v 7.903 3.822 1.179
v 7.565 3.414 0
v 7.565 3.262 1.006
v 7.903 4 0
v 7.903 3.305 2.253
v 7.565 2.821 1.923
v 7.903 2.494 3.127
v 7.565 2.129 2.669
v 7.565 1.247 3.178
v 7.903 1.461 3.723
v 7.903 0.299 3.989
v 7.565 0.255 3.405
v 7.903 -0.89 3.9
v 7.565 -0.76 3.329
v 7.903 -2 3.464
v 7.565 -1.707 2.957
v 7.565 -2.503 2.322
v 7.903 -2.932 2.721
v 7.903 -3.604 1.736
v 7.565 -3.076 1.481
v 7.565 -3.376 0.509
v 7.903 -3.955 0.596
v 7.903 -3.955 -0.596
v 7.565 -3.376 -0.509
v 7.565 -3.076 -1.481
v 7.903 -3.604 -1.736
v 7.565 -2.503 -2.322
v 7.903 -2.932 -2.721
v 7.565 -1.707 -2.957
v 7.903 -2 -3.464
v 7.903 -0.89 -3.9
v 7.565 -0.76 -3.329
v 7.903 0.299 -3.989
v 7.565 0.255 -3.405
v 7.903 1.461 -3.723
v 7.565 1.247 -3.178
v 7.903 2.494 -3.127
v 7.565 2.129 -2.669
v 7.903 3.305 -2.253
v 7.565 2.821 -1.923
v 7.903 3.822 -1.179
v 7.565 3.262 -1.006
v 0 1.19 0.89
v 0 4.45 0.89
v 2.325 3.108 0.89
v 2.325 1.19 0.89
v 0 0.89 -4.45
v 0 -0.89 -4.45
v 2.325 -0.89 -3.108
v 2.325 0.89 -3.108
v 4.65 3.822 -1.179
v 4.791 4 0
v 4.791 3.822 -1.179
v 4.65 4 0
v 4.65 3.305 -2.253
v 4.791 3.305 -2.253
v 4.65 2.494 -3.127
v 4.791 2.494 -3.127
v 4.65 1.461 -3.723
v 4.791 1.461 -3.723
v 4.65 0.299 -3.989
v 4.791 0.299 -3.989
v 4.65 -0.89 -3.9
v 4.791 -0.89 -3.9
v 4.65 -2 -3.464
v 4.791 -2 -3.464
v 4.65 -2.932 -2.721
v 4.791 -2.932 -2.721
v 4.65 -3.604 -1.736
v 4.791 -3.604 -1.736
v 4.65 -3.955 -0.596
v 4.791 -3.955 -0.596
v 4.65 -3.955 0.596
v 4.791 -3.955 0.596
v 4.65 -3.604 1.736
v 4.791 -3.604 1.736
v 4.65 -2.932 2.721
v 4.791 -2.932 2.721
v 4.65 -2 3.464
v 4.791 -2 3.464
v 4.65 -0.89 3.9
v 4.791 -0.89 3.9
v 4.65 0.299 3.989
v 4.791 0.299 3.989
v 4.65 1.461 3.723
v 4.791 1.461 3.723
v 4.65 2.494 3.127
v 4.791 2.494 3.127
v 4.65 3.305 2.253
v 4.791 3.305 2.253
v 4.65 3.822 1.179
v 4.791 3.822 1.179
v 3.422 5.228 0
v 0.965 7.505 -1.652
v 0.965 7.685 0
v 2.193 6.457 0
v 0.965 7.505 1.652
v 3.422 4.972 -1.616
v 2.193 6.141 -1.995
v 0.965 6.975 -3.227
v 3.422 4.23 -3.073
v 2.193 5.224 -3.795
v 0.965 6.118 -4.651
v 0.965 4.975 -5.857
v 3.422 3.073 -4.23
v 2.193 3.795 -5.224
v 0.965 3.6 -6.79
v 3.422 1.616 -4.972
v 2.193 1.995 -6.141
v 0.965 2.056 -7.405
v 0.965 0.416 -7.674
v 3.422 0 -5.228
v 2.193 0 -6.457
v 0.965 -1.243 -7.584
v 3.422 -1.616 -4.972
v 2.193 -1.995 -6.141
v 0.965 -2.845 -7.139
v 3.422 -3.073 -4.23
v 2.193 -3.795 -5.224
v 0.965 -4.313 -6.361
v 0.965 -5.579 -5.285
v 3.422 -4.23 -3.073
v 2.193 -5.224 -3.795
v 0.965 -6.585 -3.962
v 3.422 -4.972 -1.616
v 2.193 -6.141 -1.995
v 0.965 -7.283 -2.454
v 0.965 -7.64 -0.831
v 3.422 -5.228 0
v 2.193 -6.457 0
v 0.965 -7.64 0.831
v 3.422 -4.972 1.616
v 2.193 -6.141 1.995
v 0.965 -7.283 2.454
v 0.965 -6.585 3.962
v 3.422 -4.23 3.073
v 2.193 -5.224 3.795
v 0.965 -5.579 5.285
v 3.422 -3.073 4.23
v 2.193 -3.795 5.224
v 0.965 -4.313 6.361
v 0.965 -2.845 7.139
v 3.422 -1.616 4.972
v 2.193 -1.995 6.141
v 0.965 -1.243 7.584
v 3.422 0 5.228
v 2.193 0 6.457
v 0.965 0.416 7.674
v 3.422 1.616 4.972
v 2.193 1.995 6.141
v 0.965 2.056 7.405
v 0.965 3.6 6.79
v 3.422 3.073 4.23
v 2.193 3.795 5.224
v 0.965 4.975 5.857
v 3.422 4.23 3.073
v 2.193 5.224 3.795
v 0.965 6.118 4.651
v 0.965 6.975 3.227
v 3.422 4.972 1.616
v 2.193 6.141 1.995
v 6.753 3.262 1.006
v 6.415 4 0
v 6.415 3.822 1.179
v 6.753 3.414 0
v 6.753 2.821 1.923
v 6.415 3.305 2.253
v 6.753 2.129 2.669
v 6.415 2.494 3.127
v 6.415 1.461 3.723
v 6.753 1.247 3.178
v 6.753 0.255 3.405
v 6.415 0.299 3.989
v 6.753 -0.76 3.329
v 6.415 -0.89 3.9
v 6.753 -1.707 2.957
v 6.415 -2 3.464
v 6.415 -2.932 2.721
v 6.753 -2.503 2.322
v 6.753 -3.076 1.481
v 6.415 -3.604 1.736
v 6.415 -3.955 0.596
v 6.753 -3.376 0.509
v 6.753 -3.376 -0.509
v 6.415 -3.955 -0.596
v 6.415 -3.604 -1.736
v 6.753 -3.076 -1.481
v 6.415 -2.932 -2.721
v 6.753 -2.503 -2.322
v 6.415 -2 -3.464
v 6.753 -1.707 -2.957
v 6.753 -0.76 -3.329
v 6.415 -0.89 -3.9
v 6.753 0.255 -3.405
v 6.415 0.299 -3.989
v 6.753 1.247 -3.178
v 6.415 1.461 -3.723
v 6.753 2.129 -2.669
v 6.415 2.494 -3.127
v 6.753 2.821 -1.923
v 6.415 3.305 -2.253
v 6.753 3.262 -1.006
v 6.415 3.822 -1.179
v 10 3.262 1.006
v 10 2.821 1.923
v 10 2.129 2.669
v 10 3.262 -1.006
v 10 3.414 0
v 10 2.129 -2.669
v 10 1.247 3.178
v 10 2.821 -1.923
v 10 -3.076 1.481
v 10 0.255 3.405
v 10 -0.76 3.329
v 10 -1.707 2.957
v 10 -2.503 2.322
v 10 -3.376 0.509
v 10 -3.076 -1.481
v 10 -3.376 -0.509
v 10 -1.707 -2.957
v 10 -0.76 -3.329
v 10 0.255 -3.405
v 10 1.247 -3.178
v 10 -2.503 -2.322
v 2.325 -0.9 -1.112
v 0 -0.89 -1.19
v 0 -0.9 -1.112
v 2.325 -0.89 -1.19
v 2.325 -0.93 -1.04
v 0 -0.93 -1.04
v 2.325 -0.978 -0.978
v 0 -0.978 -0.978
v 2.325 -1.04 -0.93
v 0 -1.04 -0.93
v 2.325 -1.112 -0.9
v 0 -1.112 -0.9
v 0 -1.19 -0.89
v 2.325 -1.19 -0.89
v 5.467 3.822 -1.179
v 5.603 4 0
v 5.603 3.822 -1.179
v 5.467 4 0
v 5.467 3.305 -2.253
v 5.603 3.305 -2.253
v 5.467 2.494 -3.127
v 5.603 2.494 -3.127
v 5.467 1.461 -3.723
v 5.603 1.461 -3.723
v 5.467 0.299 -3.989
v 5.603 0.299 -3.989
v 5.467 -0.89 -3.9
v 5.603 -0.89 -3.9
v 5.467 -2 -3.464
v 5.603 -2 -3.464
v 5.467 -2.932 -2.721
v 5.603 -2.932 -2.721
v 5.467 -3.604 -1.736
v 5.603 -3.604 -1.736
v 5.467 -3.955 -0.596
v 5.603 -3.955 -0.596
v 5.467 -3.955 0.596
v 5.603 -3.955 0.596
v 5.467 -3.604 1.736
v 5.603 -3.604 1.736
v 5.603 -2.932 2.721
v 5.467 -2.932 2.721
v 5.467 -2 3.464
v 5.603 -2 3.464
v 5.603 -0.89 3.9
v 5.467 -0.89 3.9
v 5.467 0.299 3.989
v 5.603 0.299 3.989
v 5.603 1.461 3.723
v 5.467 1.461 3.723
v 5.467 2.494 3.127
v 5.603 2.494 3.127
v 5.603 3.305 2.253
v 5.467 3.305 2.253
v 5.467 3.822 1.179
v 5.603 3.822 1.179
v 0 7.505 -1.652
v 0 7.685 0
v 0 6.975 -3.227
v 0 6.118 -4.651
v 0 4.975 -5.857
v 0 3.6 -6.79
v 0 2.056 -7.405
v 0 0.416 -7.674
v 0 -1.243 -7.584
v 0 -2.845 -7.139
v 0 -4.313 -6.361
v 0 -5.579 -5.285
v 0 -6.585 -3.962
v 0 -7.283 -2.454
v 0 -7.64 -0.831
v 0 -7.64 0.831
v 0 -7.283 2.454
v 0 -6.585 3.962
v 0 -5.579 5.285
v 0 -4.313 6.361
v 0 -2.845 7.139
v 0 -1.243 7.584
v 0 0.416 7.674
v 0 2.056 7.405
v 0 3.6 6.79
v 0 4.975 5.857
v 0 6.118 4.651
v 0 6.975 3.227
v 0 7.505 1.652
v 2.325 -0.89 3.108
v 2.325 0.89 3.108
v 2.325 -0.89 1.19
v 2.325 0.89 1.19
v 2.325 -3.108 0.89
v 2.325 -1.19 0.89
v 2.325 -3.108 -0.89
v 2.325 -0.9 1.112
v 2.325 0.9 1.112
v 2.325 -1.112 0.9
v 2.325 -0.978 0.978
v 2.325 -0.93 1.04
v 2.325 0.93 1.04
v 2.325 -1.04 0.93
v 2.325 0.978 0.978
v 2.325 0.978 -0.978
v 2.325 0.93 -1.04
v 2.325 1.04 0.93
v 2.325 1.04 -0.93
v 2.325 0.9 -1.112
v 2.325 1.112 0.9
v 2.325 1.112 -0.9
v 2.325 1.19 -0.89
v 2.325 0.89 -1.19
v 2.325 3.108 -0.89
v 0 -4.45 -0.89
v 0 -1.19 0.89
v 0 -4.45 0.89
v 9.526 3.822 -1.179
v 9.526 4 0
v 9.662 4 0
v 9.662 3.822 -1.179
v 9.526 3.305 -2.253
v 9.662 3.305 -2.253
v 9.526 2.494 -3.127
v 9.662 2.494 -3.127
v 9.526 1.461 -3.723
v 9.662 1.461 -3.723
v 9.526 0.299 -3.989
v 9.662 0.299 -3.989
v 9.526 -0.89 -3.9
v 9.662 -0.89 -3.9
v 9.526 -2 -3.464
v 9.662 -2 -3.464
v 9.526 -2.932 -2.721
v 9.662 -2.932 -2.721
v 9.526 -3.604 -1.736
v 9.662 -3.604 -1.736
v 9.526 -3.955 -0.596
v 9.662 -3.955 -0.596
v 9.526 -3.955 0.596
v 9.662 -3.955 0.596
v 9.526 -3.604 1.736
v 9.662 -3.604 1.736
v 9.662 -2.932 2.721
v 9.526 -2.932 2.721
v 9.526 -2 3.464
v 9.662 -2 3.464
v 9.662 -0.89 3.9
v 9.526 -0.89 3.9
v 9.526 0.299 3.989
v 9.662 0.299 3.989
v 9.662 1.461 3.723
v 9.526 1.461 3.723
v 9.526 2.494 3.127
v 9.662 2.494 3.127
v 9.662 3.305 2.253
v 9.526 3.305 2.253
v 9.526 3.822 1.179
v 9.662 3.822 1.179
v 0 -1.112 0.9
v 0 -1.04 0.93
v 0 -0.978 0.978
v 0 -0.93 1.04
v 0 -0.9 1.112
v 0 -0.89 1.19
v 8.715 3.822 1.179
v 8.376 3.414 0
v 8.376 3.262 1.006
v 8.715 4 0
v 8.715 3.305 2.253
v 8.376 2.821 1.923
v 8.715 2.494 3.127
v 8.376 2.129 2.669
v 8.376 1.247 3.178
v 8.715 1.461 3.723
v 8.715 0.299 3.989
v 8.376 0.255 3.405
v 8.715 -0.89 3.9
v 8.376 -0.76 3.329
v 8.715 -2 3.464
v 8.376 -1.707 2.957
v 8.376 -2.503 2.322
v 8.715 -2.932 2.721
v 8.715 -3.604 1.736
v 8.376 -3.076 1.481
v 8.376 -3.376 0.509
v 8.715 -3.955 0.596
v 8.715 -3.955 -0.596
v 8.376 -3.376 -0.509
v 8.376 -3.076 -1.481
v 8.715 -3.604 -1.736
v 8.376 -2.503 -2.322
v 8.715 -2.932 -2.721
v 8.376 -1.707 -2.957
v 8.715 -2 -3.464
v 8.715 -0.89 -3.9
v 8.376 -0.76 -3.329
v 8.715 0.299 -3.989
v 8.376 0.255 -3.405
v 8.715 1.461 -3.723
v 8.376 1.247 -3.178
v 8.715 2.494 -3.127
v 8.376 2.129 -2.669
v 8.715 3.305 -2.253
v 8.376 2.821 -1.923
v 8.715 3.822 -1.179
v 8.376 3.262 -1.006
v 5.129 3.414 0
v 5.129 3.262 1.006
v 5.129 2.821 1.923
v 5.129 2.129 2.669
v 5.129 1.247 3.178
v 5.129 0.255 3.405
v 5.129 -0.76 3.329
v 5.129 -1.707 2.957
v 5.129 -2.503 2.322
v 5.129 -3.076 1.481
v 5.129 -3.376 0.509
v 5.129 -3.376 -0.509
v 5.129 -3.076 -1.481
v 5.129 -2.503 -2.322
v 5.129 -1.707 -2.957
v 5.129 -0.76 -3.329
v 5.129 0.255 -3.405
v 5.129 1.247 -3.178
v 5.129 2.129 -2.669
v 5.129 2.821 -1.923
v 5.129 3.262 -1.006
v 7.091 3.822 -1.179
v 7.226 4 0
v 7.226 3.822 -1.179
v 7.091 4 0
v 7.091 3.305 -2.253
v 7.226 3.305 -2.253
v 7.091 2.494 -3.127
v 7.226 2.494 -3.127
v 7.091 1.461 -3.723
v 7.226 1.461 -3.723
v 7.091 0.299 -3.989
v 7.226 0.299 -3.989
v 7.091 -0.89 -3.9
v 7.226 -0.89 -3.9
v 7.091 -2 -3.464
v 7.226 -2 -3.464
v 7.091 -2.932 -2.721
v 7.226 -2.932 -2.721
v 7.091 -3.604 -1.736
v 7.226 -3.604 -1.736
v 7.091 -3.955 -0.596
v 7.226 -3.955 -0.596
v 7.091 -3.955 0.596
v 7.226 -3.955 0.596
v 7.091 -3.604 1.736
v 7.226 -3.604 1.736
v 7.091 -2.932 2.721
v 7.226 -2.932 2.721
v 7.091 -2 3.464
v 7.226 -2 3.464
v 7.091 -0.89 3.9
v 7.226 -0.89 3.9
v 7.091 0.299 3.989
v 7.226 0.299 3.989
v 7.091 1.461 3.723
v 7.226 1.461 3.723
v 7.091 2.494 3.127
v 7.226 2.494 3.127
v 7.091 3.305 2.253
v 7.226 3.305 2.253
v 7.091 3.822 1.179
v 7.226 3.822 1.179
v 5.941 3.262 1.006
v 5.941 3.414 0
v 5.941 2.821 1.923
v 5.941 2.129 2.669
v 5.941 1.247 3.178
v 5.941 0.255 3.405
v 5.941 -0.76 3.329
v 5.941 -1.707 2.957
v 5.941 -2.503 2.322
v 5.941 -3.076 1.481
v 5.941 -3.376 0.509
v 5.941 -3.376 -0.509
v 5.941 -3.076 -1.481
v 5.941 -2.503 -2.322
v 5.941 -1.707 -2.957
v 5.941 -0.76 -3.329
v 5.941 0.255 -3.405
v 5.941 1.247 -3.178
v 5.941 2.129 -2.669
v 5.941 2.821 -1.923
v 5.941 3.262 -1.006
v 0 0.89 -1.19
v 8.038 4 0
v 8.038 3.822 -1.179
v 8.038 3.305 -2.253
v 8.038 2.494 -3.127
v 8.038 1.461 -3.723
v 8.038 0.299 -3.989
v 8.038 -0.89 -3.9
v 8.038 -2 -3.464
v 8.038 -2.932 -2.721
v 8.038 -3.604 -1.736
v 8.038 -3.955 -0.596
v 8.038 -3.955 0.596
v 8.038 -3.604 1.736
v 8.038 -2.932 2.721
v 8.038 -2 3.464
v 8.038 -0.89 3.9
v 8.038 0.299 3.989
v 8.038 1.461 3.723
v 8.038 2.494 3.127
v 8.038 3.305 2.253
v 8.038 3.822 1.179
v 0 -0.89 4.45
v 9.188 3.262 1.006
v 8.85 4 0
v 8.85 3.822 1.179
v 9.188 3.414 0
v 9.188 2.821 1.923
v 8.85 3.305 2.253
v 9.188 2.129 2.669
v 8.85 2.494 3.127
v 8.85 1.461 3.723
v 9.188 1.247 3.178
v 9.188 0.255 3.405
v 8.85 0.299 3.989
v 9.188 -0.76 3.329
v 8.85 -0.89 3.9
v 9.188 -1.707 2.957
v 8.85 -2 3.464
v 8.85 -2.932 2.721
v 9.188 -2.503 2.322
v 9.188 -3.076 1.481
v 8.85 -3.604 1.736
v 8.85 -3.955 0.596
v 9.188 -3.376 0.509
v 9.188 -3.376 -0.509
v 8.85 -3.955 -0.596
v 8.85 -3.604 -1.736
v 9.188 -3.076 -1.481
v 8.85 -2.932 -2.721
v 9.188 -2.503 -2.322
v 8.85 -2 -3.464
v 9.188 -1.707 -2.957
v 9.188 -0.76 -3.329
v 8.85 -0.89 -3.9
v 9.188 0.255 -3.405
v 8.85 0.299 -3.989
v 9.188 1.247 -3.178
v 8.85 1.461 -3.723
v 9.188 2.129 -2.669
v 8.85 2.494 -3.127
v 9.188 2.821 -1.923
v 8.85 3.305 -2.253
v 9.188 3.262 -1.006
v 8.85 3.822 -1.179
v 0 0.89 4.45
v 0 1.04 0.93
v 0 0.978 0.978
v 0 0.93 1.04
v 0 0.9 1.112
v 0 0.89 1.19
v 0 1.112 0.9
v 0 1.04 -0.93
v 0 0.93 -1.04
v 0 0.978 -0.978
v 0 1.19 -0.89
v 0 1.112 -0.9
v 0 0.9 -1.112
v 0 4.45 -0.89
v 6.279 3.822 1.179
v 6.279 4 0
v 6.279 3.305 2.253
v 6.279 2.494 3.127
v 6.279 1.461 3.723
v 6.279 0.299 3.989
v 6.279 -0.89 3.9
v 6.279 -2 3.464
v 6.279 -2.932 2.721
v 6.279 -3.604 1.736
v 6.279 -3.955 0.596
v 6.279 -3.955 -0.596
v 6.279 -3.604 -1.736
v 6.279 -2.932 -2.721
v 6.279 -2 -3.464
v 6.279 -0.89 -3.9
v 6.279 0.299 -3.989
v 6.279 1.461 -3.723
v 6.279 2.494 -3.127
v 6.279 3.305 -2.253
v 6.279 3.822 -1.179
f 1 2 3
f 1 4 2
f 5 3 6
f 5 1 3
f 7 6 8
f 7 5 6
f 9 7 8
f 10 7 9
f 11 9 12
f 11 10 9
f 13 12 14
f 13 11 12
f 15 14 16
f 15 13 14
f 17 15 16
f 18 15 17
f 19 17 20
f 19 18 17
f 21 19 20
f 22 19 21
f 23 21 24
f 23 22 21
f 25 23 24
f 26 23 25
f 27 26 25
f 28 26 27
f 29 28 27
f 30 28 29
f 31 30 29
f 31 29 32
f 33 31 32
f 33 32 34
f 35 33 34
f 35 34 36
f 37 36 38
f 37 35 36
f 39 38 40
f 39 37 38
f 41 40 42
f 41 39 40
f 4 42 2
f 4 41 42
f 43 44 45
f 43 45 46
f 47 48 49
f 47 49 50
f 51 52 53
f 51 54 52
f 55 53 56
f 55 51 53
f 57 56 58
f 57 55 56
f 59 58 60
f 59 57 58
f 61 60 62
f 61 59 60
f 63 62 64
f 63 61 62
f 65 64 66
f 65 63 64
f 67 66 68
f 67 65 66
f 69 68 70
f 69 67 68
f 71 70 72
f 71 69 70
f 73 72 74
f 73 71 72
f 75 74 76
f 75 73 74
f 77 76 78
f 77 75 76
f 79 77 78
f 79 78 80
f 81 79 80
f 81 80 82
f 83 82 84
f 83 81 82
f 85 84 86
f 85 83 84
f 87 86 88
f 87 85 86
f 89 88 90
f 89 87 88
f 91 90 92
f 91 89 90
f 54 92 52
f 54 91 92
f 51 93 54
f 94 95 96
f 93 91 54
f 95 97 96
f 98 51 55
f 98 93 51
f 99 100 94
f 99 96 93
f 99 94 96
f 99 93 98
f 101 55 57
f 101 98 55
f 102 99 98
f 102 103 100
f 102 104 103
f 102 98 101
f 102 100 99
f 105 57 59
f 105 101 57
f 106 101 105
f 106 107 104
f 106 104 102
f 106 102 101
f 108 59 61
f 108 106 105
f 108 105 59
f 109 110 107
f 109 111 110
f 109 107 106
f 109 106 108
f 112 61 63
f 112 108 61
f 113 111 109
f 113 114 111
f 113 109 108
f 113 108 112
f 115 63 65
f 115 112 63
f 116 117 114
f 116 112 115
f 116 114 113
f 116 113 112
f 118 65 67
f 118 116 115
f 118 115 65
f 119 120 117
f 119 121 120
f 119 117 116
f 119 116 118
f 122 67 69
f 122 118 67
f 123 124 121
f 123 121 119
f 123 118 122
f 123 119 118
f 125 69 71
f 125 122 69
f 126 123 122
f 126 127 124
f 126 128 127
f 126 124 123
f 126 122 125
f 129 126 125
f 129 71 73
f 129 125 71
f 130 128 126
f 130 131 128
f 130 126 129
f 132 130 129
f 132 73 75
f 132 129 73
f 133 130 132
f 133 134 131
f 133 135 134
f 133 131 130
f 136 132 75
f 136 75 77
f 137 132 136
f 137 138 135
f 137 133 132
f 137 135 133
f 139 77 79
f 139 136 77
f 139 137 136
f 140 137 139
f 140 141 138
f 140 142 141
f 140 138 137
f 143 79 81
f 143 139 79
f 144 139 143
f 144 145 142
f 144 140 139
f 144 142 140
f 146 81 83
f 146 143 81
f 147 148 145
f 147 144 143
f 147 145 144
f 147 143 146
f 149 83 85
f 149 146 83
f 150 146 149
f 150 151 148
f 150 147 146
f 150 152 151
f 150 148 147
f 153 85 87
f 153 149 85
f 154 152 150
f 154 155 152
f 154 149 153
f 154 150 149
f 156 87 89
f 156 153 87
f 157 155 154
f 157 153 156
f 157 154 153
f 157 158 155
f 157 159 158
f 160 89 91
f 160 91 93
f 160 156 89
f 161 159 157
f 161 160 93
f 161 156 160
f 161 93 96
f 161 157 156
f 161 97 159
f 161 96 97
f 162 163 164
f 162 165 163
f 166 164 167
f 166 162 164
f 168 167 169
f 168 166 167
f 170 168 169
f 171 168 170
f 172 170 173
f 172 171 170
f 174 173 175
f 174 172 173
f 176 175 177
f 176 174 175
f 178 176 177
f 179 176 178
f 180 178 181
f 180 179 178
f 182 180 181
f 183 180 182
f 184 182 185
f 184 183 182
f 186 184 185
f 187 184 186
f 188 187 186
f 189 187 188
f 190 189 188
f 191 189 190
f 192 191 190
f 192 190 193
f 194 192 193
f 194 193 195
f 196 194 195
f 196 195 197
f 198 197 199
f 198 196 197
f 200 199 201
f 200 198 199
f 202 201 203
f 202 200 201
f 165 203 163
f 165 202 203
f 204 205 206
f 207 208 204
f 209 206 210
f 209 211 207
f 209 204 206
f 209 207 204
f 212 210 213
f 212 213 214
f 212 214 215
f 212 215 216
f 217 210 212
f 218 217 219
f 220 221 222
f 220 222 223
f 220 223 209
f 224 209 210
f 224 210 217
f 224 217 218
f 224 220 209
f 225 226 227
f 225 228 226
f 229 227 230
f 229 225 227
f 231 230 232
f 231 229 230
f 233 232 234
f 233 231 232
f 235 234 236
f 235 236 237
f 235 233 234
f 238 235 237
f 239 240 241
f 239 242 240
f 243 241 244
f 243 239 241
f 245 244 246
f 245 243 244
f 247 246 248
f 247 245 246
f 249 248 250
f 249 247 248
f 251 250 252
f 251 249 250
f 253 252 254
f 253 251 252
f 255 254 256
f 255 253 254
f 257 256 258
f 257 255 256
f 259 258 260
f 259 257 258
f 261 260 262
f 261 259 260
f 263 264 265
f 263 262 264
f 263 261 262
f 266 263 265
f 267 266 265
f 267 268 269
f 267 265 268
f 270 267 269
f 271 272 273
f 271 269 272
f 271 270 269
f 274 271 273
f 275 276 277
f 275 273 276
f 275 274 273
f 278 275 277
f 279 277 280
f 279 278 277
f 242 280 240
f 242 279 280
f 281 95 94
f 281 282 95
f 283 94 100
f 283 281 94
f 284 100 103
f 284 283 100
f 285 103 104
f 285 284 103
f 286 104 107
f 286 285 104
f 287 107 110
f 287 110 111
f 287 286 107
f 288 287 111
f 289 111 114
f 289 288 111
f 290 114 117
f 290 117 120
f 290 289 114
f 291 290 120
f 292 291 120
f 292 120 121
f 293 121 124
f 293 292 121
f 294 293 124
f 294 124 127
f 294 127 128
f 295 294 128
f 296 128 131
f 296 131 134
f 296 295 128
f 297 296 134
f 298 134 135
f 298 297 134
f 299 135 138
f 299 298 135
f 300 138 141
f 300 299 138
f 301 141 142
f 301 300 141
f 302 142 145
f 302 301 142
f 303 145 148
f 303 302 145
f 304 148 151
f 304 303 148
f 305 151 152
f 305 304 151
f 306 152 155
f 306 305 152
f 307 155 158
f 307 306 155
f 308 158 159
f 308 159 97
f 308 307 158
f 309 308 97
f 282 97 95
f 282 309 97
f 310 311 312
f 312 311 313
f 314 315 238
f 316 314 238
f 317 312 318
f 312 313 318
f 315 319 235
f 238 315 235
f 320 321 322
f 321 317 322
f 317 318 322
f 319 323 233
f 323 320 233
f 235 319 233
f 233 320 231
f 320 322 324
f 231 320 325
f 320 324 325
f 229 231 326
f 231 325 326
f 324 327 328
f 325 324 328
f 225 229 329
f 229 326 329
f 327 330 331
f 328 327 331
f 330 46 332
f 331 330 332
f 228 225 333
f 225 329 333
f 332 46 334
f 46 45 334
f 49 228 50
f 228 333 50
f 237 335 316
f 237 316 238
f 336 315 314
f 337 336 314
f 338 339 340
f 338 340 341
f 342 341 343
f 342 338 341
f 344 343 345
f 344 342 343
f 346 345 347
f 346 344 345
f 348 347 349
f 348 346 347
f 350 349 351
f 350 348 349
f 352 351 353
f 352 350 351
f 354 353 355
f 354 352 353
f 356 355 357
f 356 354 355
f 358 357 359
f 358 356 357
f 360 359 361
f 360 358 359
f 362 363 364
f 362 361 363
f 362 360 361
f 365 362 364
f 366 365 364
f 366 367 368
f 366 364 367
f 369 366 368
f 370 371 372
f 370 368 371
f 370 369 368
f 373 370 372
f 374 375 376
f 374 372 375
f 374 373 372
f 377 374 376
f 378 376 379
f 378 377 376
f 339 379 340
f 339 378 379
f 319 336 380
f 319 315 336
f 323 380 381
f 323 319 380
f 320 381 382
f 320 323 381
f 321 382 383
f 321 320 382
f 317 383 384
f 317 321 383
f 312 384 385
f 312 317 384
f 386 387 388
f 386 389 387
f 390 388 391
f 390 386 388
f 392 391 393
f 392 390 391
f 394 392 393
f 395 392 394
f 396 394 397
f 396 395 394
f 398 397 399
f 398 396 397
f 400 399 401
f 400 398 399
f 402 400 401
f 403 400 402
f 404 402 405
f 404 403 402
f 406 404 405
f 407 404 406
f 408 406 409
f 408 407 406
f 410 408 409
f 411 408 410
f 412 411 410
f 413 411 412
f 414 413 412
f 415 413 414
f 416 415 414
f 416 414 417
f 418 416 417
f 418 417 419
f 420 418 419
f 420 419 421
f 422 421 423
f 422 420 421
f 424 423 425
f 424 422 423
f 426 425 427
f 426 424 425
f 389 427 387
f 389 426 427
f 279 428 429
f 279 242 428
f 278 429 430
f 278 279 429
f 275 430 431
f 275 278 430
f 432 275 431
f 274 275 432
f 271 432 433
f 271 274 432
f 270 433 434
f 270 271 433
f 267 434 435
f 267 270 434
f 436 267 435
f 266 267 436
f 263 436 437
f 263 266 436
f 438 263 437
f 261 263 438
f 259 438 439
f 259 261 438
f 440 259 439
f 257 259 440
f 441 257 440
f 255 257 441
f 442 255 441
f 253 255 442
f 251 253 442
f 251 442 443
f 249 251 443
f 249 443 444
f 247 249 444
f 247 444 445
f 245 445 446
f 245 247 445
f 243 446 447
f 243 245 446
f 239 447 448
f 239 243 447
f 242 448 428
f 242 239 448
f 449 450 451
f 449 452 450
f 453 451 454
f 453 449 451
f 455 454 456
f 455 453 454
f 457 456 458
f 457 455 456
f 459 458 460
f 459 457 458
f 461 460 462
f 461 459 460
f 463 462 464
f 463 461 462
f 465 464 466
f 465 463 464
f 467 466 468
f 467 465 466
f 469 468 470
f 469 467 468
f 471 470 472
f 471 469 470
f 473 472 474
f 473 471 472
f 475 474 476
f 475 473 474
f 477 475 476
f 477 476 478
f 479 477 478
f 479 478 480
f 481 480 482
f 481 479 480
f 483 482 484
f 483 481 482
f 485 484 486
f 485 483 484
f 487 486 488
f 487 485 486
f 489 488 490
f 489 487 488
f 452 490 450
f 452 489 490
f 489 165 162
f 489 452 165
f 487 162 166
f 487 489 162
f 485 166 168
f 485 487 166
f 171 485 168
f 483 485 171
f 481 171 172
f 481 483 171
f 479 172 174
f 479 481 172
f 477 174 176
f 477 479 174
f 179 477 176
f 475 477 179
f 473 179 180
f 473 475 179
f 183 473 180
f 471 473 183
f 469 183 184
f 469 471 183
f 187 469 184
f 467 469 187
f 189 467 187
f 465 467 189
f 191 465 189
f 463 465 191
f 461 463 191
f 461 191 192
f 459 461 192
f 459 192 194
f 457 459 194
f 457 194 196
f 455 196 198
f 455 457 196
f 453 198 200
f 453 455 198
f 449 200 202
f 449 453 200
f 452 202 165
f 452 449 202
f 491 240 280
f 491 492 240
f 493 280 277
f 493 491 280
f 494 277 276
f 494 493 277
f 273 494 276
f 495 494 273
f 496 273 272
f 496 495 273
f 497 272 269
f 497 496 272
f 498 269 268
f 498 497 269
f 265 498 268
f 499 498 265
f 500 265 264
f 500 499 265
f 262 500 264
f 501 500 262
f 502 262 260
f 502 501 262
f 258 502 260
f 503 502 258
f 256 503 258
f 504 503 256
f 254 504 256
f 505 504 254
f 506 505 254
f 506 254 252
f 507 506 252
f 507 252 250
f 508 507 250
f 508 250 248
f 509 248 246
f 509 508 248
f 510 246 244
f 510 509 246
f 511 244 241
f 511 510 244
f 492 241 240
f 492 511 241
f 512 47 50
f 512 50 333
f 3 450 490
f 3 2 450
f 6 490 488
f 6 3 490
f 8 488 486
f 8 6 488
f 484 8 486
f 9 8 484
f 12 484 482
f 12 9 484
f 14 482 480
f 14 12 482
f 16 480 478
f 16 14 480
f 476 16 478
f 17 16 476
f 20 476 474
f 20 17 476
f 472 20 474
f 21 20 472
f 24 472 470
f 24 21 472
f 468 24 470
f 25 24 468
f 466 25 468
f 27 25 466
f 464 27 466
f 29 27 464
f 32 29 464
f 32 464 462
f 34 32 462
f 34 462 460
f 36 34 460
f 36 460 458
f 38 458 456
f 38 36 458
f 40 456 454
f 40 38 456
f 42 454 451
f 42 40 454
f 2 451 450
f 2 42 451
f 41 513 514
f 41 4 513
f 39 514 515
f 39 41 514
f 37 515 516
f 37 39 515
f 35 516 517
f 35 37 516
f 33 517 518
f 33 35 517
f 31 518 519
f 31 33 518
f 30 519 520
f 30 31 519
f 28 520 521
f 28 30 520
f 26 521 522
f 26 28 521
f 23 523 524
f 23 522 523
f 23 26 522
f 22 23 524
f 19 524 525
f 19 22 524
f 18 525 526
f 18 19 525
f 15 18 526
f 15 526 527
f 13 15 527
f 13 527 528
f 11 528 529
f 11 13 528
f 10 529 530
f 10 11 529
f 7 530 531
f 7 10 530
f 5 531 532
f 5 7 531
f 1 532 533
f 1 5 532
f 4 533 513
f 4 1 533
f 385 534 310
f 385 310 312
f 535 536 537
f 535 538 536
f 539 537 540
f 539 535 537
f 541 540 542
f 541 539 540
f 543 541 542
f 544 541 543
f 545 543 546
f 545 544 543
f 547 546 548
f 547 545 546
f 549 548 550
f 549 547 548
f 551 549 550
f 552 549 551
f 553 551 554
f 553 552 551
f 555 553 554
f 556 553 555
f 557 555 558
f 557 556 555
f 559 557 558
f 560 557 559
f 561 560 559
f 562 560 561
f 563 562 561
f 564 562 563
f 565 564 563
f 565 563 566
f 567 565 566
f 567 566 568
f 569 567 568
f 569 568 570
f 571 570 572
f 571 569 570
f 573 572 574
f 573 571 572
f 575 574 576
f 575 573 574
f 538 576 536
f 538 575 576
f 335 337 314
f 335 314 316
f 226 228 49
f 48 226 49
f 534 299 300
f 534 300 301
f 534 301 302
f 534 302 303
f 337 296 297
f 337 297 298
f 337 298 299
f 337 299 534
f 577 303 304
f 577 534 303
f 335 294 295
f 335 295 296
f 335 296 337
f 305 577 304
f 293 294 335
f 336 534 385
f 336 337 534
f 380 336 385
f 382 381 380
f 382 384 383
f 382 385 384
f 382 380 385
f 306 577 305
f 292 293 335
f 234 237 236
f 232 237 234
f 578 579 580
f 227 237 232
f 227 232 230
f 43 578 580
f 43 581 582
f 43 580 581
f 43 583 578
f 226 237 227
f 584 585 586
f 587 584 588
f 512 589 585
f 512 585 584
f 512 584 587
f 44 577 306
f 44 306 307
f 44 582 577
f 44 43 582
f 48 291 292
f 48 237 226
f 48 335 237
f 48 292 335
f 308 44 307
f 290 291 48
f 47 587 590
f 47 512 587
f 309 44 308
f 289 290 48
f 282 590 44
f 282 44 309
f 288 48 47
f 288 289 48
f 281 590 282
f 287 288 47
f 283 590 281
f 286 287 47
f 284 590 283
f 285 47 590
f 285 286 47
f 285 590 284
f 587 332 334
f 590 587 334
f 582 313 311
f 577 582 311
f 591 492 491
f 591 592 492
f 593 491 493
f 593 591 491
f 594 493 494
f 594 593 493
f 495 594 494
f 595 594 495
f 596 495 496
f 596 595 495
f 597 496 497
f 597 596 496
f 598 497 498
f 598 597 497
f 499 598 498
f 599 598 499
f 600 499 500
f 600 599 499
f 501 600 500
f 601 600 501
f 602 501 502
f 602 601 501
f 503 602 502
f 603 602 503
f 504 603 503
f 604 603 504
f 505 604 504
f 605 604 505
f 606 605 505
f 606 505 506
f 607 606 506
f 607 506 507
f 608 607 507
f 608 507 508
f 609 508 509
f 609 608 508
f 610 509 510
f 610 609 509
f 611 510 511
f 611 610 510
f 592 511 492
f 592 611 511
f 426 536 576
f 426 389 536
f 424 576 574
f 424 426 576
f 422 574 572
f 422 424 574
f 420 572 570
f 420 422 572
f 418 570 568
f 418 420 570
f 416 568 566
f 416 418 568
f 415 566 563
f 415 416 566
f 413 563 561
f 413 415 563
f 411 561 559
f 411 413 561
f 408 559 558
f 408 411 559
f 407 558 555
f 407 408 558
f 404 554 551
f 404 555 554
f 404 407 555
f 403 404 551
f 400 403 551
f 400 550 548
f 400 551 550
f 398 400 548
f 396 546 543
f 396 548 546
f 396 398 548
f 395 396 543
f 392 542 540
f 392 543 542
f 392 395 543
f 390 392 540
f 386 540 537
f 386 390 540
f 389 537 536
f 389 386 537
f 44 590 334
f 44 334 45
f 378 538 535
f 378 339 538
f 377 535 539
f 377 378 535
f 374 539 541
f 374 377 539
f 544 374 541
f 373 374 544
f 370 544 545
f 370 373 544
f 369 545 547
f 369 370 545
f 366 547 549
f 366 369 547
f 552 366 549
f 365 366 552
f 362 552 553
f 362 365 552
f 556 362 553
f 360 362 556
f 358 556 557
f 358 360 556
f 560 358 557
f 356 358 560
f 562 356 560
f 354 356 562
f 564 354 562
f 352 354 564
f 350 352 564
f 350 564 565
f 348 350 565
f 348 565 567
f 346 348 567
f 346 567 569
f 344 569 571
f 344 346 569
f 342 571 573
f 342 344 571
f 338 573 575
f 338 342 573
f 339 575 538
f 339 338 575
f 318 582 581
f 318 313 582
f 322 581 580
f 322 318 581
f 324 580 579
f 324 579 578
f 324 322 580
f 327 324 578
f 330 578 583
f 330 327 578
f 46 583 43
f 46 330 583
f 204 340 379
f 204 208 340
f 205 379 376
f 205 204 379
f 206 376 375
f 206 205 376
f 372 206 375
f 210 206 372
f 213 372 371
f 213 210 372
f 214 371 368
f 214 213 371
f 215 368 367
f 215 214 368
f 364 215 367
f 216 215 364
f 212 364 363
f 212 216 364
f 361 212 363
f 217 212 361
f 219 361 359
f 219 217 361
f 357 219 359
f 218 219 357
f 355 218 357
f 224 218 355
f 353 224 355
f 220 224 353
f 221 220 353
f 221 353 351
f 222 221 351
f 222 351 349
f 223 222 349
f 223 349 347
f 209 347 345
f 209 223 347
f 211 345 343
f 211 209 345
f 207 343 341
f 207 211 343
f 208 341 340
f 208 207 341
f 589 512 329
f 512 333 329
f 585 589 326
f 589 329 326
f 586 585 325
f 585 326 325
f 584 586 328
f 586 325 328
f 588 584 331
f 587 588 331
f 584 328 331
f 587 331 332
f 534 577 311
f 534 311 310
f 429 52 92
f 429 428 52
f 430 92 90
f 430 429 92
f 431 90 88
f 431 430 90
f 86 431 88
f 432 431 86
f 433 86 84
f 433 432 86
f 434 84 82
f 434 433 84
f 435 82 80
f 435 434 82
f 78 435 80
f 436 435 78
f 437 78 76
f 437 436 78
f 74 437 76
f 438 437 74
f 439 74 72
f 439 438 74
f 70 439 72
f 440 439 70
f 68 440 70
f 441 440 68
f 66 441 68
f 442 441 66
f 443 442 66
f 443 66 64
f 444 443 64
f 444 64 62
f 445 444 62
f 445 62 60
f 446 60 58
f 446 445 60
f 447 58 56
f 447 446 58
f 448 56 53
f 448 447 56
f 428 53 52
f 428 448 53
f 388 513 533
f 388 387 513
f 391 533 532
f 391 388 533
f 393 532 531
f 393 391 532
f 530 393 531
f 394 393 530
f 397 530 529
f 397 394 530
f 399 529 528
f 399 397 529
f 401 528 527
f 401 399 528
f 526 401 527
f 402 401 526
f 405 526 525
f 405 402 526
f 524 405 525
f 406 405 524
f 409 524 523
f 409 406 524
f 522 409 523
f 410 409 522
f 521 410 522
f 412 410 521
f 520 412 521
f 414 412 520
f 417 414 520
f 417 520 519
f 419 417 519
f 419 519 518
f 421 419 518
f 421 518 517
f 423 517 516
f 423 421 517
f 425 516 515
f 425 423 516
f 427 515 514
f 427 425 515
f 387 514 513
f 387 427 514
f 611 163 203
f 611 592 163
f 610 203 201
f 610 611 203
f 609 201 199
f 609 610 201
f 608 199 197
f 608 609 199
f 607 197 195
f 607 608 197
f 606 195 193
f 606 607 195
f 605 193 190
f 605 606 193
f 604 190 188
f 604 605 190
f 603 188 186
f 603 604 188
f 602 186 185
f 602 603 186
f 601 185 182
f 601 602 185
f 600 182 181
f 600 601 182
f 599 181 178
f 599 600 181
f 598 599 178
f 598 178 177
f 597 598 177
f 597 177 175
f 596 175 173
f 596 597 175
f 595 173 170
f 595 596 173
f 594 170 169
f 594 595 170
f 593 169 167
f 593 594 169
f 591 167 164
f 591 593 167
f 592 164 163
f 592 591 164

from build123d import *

# Parameters (mm, degrees)
CROSSRECESS_DEPTH = 2.325
DRAFT9_ANGLE      = 30
FILLET5_R         = 0.3
LPATTERN10_COUNT  = 7
LPATTERN10_PITCH  = 0.8118


with BuildPart() as part:
    # Sketch1 → Base (revolve)
    with BuildSketch(Plane.XY):
        Polygon((10, 4), (7.15, 4), (4.65, 4), (0.965, 7.685), (0, 7.685), (0, 0), (10, 0), align=None)
    revolve(axis=Axis((4.515812911, 0, 0), (-1, 0, 0)))

    # Sketch6 → CrossRecess (cut)
    with BuildSketch(Plane(origin=(0, 0, 0), x_dir=(0, 0, -1), z_dir=(1, 0, 0))):
        Polygon((0.89, 0.89), (0.89, 4.45), (-0.89, 4.45), (-0.89, 0.89), (-4.45, 0.89), (-4.45, -0.89), (-0.89, -0.89), (-0.89, -4.45), (0.89, -4.45), (0.89, -0.89), (4.45, -0.89), (4.45, 0.89), align=None)
    extrude(amount=CROSSRECESS_DEPTH, mode=Mode.SUBTRACT)

    # Draft9
    draft9_faces = [part.faces().sort_by_distance(p)[0] for p in [
        (1.1625, 4.45, 0),
        (1.1625, 0, 4.45),
        (1.1625, -4.45, 0),
        (1.1625, 0, -4.45),
    ]]
    draft(draft9_faces, Plane(origin=(0, 7.685, 0), x_dir=(0, 0, -1), z_dir=(-1, 0, 0)), DRAFT9_ANGLE)

    # Fillet5
    fillet5_edges = [part.edges().sort_by_distance(p)[0] for p in [
        (1.1625, 0.89, 0.89),
        (1.1625, -0.89, 0.89),
        (1.1625, -0.89, -0.89),
        (1.1625, 0.89, -0.89),
    ]]
    fillet(fillet5_edges, radius=FILLET5_R)

    # Sketch9 → Cut-Revolve10 (revolve, cut)
    with BuildSketch(Plane.XY):
        Polygon((10, 3.414133814), (10.33825, 4), (10.33825, 4.6765), (9.66175, 4.6765), (9.66175, 4), align=None)
    cut_revolve10 = revolve(axis=Axis((0, 0, 0), (1, 0, 0)), mode=Mode.SUBTRACT)

    # LPattern10: Cut-Revolve10 ×7
    with Locations(*[(-i * LPATTERN10_PITCH, 0, 0) for i in range(1, LPATTERN10_COUNT)]):
        add(cut_revolve10, mode=Mode.SUBTRACT)


solid = part.part
